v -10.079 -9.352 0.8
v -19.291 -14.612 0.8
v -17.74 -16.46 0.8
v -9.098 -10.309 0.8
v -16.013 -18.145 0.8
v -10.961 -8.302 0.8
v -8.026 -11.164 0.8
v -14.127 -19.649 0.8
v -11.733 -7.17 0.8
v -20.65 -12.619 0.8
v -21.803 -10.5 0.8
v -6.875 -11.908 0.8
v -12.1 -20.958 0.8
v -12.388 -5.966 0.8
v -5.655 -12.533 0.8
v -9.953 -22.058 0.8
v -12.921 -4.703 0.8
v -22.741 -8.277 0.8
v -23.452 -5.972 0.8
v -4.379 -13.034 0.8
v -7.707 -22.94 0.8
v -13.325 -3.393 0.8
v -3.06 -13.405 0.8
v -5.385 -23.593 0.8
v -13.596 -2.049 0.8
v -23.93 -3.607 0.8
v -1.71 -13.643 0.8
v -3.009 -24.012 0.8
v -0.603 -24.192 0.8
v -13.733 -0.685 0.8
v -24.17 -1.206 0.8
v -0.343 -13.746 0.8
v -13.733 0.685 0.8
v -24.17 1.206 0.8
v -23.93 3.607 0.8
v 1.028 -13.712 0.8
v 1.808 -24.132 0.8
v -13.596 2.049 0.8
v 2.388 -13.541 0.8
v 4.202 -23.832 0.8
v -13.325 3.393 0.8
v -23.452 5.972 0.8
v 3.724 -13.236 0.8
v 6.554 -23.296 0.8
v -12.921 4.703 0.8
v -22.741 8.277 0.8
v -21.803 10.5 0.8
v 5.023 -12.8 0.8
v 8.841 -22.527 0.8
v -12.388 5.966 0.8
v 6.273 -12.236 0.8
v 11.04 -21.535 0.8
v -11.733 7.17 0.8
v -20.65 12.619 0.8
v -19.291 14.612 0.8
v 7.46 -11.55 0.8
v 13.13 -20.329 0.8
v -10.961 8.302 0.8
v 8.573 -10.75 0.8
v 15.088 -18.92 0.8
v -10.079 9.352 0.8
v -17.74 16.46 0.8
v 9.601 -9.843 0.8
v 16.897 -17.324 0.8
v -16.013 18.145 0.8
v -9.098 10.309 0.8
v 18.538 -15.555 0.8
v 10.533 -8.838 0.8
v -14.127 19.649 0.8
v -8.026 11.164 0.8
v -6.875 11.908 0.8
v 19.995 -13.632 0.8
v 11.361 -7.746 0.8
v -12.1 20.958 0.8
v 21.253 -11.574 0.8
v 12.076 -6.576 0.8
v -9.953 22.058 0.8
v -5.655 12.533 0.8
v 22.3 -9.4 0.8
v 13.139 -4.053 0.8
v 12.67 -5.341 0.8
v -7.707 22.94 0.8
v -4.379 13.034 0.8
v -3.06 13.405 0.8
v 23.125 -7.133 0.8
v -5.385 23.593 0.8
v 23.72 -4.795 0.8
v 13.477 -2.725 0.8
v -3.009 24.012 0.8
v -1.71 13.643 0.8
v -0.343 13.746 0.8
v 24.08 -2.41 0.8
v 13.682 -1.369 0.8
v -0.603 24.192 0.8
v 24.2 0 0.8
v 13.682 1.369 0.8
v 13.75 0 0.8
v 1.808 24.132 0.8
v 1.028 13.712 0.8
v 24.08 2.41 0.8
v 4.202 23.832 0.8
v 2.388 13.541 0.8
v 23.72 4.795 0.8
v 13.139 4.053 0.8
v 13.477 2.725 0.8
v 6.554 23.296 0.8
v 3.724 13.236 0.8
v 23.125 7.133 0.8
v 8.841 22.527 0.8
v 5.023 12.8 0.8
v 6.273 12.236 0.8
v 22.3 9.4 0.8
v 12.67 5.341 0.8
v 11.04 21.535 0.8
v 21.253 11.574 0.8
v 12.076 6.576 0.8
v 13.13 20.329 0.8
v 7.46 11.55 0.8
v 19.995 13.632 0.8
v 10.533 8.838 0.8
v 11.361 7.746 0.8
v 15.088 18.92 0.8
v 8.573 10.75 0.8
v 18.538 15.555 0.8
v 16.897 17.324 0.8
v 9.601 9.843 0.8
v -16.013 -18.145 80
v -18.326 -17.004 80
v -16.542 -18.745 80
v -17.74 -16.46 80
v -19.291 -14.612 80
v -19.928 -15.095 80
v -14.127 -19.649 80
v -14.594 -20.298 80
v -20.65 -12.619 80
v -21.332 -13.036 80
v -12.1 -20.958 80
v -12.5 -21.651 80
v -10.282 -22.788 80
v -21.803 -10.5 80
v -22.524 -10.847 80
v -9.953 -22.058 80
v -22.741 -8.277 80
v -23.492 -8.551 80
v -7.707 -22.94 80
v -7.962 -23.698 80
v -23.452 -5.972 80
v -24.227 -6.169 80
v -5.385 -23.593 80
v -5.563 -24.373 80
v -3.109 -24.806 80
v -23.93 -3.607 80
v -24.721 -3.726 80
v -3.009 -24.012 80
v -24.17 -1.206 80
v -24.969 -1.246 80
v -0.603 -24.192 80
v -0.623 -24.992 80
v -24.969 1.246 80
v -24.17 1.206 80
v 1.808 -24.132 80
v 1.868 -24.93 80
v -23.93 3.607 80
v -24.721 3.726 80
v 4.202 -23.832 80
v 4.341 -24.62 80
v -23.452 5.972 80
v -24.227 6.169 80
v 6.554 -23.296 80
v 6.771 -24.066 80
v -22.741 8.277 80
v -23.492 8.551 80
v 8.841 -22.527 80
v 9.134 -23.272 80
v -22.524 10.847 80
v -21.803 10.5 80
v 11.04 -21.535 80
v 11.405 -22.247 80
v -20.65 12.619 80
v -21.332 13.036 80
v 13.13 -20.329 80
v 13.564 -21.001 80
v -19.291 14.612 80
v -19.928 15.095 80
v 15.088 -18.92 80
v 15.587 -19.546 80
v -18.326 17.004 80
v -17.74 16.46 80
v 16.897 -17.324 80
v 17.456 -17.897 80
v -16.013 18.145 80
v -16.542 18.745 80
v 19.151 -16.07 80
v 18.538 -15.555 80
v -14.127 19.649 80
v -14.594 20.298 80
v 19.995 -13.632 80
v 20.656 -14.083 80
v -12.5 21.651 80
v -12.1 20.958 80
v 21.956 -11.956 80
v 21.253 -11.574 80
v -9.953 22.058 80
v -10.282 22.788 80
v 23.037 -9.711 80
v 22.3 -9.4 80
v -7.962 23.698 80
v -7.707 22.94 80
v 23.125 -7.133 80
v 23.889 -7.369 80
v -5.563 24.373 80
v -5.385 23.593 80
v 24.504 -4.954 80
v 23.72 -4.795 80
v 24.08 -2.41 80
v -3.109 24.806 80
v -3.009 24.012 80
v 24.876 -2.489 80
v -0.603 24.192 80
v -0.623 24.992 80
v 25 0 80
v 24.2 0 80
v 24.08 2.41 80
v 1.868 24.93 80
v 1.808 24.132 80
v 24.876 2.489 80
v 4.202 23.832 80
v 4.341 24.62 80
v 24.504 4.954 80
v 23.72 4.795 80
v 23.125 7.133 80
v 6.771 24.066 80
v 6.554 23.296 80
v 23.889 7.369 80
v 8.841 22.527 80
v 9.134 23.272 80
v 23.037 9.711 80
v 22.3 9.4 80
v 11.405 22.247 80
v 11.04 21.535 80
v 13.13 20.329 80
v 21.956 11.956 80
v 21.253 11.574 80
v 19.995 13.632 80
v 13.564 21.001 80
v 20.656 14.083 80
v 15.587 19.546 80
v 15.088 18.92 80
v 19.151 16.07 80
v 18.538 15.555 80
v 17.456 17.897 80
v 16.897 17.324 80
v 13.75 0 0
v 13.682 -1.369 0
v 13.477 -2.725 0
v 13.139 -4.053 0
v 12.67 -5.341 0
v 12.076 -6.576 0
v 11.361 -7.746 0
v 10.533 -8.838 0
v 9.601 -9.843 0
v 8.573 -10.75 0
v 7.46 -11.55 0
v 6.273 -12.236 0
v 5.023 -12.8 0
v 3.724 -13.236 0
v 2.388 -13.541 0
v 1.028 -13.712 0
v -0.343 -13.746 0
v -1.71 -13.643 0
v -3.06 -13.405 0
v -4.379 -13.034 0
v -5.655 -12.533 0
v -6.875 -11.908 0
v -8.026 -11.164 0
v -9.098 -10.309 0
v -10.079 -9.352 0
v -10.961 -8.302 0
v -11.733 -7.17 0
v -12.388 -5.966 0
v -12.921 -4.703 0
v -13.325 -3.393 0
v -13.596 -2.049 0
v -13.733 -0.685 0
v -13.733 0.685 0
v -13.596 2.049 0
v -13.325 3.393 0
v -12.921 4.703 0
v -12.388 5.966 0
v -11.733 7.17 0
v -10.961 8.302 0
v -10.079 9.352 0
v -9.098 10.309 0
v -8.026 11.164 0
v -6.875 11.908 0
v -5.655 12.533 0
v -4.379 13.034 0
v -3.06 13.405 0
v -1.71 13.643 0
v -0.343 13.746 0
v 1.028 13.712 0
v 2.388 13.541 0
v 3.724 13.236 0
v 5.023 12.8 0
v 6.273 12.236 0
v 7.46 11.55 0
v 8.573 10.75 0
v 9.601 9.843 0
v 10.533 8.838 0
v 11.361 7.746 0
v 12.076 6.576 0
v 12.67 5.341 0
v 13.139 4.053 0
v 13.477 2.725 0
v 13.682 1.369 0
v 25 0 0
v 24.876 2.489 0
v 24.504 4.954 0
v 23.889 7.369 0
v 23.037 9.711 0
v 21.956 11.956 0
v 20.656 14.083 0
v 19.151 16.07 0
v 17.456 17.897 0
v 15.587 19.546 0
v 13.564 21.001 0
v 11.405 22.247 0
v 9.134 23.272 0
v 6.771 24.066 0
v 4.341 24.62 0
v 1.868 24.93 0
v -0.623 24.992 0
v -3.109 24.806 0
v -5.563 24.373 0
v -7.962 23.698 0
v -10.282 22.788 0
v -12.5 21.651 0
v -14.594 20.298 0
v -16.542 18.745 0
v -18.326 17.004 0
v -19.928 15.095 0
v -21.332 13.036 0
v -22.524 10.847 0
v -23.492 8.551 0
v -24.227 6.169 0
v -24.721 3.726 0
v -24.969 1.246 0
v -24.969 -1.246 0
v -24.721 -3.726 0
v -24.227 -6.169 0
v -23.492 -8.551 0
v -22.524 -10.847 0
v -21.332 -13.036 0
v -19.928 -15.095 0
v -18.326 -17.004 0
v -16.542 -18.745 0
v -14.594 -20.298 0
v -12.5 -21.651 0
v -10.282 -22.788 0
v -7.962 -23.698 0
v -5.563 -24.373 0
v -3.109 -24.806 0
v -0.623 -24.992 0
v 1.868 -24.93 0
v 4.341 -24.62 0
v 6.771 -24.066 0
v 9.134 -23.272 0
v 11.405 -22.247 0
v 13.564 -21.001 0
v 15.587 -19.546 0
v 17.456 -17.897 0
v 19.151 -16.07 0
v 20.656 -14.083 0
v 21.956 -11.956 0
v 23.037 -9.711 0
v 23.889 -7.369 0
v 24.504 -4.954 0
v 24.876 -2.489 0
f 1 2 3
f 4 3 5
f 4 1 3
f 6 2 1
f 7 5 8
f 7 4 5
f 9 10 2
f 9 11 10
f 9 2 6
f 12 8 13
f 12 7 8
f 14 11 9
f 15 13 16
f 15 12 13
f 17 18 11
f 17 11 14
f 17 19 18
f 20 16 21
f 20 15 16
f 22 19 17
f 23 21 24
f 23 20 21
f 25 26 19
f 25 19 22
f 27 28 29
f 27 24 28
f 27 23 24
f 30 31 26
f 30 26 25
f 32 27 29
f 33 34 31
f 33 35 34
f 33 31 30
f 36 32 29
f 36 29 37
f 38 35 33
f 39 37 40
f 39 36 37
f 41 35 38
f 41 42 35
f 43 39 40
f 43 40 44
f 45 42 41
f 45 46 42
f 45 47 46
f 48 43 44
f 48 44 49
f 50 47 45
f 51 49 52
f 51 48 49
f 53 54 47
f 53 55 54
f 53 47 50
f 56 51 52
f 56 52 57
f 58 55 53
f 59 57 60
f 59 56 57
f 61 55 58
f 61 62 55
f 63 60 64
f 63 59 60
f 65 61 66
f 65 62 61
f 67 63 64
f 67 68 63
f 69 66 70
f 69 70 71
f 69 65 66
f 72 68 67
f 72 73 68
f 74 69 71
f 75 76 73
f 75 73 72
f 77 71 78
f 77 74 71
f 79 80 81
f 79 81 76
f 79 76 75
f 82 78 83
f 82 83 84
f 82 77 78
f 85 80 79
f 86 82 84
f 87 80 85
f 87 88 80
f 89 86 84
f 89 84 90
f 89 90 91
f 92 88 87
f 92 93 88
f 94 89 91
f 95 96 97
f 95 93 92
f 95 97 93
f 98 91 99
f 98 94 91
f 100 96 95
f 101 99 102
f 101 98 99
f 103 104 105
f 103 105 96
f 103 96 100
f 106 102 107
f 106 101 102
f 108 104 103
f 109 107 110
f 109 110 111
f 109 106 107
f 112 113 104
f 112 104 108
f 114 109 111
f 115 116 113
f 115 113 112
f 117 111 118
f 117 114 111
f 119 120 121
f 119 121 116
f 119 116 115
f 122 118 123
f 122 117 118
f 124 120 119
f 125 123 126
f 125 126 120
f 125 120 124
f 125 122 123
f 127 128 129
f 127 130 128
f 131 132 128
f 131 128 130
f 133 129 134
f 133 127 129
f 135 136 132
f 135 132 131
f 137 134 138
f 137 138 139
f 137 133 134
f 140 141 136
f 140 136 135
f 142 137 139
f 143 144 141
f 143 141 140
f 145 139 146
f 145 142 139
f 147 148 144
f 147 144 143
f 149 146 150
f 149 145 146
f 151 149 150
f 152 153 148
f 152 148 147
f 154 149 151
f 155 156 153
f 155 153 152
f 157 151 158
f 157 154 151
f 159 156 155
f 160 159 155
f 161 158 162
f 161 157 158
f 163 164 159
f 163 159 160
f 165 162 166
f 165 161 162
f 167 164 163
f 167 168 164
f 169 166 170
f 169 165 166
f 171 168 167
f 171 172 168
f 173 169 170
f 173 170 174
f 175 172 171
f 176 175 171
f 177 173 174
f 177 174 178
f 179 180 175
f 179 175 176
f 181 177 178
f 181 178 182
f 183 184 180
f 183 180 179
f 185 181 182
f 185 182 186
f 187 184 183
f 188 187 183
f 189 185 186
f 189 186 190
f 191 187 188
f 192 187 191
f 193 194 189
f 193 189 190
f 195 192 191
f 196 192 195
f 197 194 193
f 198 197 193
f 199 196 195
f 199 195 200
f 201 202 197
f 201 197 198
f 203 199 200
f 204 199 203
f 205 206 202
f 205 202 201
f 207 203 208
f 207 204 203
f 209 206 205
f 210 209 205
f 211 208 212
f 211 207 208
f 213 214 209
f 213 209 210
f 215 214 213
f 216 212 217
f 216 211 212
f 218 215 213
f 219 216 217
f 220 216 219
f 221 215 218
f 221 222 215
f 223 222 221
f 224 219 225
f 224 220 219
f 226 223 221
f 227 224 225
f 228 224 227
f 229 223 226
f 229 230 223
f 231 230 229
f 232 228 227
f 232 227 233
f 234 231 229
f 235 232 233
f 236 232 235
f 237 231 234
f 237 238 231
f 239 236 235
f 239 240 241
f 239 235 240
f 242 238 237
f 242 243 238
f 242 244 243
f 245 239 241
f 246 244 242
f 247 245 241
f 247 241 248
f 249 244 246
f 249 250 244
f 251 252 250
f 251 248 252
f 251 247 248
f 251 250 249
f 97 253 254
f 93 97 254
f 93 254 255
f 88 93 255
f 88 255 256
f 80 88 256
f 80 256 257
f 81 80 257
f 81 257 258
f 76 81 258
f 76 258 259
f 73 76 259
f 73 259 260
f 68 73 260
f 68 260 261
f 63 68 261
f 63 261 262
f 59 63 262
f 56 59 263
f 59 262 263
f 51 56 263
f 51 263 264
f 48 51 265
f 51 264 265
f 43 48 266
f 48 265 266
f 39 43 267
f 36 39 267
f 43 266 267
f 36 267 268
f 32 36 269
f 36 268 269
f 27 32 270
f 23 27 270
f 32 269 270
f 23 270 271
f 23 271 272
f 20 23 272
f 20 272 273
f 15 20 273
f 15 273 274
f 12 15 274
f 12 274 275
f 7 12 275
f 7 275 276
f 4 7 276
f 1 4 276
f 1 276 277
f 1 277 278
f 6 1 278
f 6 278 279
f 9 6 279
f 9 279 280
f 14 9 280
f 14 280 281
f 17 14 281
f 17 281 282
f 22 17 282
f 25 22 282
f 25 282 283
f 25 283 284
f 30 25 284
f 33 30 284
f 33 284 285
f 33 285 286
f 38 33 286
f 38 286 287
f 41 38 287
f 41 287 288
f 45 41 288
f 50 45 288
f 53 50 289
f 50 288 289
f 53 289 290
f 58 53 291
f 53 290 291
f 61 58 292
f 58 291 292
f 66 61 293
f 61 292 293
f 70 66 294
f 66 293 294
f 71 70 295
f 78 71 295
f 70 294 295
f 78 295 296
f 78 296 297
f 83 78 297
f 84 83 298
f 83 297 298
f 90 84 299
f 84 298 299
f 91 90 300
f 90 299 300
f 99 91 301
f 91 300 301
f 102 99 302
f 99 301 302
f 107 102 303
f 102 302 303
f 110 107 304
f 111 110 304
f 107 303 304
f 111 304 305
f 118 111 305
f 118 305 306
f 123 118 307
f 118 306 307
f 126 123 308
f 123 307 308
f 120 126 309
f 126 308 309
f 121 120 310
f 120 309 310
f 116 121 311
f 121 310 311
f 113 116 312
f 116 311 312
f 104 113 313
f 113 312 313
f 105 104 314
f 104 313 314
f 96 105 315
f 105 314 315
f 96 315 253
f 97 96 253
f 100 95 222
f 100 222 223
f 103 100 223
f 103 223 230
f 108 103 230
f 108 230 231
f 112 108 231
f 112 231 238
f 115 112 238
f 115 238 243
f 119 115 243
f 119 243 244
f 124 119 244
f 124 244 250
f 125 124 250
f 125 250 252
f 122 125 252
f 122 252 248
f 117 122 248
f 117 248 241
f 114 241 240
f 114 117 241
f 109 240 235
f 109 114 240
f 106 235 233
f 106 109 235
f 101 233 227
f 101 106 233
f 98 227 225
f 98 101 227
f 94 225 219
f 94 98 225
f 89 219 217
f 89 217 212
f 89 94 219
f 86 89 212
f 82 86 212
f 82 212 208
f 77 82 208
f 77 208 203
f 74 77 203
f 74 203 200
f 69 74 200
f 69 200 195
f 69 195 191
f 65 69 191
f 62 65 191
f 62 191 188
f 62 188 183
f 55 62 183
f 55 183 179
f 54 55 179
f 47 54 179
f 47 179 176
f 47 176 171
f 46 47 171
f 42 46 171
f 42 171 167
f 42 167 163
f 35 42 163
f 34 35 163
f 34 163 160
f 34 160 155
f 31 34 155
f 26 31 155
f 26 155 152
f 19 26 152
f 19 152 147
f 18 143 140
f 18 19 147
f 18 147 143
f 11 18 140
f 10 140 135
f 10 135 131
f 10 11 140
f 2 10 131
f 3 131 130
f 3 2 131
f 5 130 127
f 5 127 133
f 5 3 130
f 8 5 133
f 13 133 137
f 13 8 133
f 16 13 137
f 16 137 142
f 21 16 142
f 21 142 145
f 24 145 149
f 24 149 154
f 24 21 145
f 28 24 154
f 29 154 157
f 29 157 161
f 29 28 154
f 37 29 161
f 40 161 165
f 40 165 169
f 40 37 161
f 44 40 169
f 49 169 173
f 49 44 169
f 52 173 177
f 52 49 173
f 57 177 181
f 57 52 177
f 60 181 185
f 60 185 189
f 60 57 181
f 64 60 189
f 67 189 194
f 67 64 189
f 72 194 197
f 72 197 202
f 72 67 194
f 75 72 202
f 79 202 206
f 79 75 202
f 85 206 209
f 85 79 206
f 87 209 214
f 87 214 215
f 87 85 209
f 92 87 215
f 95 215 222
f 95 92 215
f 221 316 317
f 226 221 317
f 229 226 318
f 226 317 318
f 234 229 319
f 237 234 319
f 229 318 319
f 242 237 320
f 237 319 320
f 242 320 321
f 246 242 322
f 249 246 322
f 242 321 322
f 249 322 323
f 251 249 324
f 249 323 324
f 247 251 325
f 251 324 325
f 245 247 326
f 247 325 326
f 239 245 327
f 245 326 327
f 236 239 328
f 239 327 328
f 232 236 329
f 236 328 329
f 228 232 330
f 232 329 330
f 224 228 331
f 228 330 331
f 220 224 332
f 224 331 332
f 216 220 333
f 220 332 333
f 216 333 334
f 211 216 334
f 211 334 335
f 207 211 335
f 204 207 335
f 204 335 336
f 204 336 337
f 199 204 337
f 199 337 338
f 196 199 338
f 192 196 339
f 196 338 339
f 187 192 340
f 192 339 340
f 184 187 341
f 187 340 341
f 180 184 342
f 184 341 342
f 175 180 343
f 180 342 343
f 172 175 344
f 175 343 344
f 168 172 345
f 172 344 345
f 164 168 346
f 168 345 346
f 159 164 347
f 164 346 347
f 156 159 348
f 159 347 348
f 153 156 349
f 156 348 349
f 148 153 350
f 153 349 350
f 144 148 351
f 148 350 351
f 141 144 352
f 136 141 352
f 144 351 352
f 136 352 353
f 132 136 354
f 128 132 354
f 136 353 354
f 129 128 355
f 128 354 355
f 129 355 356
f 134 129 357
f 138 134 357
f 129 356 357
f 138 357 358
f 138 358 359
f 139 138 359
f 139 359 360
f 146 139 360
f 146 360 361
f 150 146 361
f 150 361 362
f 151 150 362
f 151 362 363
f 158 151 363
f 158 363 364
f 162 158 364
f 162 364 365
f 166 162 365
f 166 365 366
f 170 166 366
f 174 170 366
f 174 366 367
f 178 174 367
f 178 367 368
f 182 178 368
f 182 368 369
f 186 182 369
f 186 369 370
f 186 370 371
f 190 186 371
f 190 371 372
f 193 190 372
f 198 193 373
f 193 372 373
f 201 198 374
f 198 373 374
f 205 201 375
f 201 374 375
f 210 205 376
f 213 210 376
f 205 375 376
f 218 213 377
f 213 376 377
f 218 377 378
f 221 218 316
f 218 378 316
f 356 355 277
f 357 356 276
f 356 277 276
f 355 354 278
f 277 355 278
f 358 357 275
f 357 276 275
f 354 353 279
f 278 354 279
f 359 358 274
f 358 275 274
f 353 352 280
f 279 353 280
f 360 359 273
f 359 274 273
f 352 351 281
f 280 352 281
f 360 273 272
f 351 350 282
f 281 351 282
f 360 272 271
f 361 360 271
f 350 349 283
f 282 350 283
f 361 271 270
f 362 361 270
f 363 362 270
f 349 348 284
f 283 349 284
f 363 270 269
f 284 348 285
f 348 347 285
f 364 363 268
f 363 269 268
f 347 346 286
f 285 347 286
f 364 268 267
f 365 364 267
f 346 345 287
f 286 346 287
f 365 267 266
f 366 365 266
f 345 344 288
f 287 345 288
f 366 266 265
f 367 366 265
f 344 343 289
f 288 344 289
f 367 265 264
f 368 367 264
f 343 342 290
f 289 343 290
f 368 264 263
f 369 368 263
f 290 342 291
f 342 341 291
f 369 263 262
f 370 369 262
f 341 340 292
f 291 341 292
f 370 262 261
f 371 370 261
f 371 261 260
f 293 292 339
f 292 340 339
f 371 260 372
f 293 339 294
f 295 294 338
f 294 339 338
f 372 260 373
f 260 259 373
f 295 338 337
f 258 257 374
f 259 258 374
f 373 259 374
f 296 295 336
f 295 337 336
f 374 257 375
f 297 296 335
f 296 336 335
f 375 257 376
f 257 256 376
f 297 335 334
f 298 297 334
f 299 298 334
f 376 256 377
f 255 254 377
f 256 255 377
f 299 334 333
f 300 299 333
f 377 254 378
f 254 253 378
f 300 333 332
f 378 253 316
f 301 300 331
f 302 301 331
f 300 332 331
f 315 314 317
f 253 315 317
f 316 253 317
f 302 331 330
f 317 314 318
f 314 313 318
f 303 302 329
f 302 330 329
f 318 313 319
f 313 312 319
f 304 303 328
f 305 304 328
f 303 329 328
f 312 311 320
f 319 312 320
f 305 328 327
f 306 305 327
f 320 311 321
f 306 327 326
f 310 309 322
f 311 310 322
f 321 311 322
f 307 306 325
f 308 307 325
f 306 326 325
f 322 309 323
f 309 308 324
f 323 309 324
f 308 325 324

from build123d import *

# Parameters (mm, degrees)
F0_R     = 25
F1_DEPTH = 80
F3_T     = -0.8
F2_R     = 13.75
F4_DEPTH = 25


with BuildPart() as f1:
    # F0 (on Top) → F1 (new body)
    with BuildSketch(Plane.XY):
        Circle(F0_R)
    extrude(amount=F1_DEPTH)

    # F3
    f3_openings = [f1.faces().sort_by_distance(p)[0] for p in [
        (0, 0, 80),
    ]]
    offset(amount=F3_T, openings=f3_openings)

    # F2 (on face) → F4 (cut)
    with BuildSketch(Plane(origin=(0, 0, 0), x_dir=(1, 0, 0), z_dir=(0, 0, -1))):
        Circle(F2_R)
    extrude(amount=-F4_DEPTH, mode=Mode.SUBTRACT)


solid = f1.part
